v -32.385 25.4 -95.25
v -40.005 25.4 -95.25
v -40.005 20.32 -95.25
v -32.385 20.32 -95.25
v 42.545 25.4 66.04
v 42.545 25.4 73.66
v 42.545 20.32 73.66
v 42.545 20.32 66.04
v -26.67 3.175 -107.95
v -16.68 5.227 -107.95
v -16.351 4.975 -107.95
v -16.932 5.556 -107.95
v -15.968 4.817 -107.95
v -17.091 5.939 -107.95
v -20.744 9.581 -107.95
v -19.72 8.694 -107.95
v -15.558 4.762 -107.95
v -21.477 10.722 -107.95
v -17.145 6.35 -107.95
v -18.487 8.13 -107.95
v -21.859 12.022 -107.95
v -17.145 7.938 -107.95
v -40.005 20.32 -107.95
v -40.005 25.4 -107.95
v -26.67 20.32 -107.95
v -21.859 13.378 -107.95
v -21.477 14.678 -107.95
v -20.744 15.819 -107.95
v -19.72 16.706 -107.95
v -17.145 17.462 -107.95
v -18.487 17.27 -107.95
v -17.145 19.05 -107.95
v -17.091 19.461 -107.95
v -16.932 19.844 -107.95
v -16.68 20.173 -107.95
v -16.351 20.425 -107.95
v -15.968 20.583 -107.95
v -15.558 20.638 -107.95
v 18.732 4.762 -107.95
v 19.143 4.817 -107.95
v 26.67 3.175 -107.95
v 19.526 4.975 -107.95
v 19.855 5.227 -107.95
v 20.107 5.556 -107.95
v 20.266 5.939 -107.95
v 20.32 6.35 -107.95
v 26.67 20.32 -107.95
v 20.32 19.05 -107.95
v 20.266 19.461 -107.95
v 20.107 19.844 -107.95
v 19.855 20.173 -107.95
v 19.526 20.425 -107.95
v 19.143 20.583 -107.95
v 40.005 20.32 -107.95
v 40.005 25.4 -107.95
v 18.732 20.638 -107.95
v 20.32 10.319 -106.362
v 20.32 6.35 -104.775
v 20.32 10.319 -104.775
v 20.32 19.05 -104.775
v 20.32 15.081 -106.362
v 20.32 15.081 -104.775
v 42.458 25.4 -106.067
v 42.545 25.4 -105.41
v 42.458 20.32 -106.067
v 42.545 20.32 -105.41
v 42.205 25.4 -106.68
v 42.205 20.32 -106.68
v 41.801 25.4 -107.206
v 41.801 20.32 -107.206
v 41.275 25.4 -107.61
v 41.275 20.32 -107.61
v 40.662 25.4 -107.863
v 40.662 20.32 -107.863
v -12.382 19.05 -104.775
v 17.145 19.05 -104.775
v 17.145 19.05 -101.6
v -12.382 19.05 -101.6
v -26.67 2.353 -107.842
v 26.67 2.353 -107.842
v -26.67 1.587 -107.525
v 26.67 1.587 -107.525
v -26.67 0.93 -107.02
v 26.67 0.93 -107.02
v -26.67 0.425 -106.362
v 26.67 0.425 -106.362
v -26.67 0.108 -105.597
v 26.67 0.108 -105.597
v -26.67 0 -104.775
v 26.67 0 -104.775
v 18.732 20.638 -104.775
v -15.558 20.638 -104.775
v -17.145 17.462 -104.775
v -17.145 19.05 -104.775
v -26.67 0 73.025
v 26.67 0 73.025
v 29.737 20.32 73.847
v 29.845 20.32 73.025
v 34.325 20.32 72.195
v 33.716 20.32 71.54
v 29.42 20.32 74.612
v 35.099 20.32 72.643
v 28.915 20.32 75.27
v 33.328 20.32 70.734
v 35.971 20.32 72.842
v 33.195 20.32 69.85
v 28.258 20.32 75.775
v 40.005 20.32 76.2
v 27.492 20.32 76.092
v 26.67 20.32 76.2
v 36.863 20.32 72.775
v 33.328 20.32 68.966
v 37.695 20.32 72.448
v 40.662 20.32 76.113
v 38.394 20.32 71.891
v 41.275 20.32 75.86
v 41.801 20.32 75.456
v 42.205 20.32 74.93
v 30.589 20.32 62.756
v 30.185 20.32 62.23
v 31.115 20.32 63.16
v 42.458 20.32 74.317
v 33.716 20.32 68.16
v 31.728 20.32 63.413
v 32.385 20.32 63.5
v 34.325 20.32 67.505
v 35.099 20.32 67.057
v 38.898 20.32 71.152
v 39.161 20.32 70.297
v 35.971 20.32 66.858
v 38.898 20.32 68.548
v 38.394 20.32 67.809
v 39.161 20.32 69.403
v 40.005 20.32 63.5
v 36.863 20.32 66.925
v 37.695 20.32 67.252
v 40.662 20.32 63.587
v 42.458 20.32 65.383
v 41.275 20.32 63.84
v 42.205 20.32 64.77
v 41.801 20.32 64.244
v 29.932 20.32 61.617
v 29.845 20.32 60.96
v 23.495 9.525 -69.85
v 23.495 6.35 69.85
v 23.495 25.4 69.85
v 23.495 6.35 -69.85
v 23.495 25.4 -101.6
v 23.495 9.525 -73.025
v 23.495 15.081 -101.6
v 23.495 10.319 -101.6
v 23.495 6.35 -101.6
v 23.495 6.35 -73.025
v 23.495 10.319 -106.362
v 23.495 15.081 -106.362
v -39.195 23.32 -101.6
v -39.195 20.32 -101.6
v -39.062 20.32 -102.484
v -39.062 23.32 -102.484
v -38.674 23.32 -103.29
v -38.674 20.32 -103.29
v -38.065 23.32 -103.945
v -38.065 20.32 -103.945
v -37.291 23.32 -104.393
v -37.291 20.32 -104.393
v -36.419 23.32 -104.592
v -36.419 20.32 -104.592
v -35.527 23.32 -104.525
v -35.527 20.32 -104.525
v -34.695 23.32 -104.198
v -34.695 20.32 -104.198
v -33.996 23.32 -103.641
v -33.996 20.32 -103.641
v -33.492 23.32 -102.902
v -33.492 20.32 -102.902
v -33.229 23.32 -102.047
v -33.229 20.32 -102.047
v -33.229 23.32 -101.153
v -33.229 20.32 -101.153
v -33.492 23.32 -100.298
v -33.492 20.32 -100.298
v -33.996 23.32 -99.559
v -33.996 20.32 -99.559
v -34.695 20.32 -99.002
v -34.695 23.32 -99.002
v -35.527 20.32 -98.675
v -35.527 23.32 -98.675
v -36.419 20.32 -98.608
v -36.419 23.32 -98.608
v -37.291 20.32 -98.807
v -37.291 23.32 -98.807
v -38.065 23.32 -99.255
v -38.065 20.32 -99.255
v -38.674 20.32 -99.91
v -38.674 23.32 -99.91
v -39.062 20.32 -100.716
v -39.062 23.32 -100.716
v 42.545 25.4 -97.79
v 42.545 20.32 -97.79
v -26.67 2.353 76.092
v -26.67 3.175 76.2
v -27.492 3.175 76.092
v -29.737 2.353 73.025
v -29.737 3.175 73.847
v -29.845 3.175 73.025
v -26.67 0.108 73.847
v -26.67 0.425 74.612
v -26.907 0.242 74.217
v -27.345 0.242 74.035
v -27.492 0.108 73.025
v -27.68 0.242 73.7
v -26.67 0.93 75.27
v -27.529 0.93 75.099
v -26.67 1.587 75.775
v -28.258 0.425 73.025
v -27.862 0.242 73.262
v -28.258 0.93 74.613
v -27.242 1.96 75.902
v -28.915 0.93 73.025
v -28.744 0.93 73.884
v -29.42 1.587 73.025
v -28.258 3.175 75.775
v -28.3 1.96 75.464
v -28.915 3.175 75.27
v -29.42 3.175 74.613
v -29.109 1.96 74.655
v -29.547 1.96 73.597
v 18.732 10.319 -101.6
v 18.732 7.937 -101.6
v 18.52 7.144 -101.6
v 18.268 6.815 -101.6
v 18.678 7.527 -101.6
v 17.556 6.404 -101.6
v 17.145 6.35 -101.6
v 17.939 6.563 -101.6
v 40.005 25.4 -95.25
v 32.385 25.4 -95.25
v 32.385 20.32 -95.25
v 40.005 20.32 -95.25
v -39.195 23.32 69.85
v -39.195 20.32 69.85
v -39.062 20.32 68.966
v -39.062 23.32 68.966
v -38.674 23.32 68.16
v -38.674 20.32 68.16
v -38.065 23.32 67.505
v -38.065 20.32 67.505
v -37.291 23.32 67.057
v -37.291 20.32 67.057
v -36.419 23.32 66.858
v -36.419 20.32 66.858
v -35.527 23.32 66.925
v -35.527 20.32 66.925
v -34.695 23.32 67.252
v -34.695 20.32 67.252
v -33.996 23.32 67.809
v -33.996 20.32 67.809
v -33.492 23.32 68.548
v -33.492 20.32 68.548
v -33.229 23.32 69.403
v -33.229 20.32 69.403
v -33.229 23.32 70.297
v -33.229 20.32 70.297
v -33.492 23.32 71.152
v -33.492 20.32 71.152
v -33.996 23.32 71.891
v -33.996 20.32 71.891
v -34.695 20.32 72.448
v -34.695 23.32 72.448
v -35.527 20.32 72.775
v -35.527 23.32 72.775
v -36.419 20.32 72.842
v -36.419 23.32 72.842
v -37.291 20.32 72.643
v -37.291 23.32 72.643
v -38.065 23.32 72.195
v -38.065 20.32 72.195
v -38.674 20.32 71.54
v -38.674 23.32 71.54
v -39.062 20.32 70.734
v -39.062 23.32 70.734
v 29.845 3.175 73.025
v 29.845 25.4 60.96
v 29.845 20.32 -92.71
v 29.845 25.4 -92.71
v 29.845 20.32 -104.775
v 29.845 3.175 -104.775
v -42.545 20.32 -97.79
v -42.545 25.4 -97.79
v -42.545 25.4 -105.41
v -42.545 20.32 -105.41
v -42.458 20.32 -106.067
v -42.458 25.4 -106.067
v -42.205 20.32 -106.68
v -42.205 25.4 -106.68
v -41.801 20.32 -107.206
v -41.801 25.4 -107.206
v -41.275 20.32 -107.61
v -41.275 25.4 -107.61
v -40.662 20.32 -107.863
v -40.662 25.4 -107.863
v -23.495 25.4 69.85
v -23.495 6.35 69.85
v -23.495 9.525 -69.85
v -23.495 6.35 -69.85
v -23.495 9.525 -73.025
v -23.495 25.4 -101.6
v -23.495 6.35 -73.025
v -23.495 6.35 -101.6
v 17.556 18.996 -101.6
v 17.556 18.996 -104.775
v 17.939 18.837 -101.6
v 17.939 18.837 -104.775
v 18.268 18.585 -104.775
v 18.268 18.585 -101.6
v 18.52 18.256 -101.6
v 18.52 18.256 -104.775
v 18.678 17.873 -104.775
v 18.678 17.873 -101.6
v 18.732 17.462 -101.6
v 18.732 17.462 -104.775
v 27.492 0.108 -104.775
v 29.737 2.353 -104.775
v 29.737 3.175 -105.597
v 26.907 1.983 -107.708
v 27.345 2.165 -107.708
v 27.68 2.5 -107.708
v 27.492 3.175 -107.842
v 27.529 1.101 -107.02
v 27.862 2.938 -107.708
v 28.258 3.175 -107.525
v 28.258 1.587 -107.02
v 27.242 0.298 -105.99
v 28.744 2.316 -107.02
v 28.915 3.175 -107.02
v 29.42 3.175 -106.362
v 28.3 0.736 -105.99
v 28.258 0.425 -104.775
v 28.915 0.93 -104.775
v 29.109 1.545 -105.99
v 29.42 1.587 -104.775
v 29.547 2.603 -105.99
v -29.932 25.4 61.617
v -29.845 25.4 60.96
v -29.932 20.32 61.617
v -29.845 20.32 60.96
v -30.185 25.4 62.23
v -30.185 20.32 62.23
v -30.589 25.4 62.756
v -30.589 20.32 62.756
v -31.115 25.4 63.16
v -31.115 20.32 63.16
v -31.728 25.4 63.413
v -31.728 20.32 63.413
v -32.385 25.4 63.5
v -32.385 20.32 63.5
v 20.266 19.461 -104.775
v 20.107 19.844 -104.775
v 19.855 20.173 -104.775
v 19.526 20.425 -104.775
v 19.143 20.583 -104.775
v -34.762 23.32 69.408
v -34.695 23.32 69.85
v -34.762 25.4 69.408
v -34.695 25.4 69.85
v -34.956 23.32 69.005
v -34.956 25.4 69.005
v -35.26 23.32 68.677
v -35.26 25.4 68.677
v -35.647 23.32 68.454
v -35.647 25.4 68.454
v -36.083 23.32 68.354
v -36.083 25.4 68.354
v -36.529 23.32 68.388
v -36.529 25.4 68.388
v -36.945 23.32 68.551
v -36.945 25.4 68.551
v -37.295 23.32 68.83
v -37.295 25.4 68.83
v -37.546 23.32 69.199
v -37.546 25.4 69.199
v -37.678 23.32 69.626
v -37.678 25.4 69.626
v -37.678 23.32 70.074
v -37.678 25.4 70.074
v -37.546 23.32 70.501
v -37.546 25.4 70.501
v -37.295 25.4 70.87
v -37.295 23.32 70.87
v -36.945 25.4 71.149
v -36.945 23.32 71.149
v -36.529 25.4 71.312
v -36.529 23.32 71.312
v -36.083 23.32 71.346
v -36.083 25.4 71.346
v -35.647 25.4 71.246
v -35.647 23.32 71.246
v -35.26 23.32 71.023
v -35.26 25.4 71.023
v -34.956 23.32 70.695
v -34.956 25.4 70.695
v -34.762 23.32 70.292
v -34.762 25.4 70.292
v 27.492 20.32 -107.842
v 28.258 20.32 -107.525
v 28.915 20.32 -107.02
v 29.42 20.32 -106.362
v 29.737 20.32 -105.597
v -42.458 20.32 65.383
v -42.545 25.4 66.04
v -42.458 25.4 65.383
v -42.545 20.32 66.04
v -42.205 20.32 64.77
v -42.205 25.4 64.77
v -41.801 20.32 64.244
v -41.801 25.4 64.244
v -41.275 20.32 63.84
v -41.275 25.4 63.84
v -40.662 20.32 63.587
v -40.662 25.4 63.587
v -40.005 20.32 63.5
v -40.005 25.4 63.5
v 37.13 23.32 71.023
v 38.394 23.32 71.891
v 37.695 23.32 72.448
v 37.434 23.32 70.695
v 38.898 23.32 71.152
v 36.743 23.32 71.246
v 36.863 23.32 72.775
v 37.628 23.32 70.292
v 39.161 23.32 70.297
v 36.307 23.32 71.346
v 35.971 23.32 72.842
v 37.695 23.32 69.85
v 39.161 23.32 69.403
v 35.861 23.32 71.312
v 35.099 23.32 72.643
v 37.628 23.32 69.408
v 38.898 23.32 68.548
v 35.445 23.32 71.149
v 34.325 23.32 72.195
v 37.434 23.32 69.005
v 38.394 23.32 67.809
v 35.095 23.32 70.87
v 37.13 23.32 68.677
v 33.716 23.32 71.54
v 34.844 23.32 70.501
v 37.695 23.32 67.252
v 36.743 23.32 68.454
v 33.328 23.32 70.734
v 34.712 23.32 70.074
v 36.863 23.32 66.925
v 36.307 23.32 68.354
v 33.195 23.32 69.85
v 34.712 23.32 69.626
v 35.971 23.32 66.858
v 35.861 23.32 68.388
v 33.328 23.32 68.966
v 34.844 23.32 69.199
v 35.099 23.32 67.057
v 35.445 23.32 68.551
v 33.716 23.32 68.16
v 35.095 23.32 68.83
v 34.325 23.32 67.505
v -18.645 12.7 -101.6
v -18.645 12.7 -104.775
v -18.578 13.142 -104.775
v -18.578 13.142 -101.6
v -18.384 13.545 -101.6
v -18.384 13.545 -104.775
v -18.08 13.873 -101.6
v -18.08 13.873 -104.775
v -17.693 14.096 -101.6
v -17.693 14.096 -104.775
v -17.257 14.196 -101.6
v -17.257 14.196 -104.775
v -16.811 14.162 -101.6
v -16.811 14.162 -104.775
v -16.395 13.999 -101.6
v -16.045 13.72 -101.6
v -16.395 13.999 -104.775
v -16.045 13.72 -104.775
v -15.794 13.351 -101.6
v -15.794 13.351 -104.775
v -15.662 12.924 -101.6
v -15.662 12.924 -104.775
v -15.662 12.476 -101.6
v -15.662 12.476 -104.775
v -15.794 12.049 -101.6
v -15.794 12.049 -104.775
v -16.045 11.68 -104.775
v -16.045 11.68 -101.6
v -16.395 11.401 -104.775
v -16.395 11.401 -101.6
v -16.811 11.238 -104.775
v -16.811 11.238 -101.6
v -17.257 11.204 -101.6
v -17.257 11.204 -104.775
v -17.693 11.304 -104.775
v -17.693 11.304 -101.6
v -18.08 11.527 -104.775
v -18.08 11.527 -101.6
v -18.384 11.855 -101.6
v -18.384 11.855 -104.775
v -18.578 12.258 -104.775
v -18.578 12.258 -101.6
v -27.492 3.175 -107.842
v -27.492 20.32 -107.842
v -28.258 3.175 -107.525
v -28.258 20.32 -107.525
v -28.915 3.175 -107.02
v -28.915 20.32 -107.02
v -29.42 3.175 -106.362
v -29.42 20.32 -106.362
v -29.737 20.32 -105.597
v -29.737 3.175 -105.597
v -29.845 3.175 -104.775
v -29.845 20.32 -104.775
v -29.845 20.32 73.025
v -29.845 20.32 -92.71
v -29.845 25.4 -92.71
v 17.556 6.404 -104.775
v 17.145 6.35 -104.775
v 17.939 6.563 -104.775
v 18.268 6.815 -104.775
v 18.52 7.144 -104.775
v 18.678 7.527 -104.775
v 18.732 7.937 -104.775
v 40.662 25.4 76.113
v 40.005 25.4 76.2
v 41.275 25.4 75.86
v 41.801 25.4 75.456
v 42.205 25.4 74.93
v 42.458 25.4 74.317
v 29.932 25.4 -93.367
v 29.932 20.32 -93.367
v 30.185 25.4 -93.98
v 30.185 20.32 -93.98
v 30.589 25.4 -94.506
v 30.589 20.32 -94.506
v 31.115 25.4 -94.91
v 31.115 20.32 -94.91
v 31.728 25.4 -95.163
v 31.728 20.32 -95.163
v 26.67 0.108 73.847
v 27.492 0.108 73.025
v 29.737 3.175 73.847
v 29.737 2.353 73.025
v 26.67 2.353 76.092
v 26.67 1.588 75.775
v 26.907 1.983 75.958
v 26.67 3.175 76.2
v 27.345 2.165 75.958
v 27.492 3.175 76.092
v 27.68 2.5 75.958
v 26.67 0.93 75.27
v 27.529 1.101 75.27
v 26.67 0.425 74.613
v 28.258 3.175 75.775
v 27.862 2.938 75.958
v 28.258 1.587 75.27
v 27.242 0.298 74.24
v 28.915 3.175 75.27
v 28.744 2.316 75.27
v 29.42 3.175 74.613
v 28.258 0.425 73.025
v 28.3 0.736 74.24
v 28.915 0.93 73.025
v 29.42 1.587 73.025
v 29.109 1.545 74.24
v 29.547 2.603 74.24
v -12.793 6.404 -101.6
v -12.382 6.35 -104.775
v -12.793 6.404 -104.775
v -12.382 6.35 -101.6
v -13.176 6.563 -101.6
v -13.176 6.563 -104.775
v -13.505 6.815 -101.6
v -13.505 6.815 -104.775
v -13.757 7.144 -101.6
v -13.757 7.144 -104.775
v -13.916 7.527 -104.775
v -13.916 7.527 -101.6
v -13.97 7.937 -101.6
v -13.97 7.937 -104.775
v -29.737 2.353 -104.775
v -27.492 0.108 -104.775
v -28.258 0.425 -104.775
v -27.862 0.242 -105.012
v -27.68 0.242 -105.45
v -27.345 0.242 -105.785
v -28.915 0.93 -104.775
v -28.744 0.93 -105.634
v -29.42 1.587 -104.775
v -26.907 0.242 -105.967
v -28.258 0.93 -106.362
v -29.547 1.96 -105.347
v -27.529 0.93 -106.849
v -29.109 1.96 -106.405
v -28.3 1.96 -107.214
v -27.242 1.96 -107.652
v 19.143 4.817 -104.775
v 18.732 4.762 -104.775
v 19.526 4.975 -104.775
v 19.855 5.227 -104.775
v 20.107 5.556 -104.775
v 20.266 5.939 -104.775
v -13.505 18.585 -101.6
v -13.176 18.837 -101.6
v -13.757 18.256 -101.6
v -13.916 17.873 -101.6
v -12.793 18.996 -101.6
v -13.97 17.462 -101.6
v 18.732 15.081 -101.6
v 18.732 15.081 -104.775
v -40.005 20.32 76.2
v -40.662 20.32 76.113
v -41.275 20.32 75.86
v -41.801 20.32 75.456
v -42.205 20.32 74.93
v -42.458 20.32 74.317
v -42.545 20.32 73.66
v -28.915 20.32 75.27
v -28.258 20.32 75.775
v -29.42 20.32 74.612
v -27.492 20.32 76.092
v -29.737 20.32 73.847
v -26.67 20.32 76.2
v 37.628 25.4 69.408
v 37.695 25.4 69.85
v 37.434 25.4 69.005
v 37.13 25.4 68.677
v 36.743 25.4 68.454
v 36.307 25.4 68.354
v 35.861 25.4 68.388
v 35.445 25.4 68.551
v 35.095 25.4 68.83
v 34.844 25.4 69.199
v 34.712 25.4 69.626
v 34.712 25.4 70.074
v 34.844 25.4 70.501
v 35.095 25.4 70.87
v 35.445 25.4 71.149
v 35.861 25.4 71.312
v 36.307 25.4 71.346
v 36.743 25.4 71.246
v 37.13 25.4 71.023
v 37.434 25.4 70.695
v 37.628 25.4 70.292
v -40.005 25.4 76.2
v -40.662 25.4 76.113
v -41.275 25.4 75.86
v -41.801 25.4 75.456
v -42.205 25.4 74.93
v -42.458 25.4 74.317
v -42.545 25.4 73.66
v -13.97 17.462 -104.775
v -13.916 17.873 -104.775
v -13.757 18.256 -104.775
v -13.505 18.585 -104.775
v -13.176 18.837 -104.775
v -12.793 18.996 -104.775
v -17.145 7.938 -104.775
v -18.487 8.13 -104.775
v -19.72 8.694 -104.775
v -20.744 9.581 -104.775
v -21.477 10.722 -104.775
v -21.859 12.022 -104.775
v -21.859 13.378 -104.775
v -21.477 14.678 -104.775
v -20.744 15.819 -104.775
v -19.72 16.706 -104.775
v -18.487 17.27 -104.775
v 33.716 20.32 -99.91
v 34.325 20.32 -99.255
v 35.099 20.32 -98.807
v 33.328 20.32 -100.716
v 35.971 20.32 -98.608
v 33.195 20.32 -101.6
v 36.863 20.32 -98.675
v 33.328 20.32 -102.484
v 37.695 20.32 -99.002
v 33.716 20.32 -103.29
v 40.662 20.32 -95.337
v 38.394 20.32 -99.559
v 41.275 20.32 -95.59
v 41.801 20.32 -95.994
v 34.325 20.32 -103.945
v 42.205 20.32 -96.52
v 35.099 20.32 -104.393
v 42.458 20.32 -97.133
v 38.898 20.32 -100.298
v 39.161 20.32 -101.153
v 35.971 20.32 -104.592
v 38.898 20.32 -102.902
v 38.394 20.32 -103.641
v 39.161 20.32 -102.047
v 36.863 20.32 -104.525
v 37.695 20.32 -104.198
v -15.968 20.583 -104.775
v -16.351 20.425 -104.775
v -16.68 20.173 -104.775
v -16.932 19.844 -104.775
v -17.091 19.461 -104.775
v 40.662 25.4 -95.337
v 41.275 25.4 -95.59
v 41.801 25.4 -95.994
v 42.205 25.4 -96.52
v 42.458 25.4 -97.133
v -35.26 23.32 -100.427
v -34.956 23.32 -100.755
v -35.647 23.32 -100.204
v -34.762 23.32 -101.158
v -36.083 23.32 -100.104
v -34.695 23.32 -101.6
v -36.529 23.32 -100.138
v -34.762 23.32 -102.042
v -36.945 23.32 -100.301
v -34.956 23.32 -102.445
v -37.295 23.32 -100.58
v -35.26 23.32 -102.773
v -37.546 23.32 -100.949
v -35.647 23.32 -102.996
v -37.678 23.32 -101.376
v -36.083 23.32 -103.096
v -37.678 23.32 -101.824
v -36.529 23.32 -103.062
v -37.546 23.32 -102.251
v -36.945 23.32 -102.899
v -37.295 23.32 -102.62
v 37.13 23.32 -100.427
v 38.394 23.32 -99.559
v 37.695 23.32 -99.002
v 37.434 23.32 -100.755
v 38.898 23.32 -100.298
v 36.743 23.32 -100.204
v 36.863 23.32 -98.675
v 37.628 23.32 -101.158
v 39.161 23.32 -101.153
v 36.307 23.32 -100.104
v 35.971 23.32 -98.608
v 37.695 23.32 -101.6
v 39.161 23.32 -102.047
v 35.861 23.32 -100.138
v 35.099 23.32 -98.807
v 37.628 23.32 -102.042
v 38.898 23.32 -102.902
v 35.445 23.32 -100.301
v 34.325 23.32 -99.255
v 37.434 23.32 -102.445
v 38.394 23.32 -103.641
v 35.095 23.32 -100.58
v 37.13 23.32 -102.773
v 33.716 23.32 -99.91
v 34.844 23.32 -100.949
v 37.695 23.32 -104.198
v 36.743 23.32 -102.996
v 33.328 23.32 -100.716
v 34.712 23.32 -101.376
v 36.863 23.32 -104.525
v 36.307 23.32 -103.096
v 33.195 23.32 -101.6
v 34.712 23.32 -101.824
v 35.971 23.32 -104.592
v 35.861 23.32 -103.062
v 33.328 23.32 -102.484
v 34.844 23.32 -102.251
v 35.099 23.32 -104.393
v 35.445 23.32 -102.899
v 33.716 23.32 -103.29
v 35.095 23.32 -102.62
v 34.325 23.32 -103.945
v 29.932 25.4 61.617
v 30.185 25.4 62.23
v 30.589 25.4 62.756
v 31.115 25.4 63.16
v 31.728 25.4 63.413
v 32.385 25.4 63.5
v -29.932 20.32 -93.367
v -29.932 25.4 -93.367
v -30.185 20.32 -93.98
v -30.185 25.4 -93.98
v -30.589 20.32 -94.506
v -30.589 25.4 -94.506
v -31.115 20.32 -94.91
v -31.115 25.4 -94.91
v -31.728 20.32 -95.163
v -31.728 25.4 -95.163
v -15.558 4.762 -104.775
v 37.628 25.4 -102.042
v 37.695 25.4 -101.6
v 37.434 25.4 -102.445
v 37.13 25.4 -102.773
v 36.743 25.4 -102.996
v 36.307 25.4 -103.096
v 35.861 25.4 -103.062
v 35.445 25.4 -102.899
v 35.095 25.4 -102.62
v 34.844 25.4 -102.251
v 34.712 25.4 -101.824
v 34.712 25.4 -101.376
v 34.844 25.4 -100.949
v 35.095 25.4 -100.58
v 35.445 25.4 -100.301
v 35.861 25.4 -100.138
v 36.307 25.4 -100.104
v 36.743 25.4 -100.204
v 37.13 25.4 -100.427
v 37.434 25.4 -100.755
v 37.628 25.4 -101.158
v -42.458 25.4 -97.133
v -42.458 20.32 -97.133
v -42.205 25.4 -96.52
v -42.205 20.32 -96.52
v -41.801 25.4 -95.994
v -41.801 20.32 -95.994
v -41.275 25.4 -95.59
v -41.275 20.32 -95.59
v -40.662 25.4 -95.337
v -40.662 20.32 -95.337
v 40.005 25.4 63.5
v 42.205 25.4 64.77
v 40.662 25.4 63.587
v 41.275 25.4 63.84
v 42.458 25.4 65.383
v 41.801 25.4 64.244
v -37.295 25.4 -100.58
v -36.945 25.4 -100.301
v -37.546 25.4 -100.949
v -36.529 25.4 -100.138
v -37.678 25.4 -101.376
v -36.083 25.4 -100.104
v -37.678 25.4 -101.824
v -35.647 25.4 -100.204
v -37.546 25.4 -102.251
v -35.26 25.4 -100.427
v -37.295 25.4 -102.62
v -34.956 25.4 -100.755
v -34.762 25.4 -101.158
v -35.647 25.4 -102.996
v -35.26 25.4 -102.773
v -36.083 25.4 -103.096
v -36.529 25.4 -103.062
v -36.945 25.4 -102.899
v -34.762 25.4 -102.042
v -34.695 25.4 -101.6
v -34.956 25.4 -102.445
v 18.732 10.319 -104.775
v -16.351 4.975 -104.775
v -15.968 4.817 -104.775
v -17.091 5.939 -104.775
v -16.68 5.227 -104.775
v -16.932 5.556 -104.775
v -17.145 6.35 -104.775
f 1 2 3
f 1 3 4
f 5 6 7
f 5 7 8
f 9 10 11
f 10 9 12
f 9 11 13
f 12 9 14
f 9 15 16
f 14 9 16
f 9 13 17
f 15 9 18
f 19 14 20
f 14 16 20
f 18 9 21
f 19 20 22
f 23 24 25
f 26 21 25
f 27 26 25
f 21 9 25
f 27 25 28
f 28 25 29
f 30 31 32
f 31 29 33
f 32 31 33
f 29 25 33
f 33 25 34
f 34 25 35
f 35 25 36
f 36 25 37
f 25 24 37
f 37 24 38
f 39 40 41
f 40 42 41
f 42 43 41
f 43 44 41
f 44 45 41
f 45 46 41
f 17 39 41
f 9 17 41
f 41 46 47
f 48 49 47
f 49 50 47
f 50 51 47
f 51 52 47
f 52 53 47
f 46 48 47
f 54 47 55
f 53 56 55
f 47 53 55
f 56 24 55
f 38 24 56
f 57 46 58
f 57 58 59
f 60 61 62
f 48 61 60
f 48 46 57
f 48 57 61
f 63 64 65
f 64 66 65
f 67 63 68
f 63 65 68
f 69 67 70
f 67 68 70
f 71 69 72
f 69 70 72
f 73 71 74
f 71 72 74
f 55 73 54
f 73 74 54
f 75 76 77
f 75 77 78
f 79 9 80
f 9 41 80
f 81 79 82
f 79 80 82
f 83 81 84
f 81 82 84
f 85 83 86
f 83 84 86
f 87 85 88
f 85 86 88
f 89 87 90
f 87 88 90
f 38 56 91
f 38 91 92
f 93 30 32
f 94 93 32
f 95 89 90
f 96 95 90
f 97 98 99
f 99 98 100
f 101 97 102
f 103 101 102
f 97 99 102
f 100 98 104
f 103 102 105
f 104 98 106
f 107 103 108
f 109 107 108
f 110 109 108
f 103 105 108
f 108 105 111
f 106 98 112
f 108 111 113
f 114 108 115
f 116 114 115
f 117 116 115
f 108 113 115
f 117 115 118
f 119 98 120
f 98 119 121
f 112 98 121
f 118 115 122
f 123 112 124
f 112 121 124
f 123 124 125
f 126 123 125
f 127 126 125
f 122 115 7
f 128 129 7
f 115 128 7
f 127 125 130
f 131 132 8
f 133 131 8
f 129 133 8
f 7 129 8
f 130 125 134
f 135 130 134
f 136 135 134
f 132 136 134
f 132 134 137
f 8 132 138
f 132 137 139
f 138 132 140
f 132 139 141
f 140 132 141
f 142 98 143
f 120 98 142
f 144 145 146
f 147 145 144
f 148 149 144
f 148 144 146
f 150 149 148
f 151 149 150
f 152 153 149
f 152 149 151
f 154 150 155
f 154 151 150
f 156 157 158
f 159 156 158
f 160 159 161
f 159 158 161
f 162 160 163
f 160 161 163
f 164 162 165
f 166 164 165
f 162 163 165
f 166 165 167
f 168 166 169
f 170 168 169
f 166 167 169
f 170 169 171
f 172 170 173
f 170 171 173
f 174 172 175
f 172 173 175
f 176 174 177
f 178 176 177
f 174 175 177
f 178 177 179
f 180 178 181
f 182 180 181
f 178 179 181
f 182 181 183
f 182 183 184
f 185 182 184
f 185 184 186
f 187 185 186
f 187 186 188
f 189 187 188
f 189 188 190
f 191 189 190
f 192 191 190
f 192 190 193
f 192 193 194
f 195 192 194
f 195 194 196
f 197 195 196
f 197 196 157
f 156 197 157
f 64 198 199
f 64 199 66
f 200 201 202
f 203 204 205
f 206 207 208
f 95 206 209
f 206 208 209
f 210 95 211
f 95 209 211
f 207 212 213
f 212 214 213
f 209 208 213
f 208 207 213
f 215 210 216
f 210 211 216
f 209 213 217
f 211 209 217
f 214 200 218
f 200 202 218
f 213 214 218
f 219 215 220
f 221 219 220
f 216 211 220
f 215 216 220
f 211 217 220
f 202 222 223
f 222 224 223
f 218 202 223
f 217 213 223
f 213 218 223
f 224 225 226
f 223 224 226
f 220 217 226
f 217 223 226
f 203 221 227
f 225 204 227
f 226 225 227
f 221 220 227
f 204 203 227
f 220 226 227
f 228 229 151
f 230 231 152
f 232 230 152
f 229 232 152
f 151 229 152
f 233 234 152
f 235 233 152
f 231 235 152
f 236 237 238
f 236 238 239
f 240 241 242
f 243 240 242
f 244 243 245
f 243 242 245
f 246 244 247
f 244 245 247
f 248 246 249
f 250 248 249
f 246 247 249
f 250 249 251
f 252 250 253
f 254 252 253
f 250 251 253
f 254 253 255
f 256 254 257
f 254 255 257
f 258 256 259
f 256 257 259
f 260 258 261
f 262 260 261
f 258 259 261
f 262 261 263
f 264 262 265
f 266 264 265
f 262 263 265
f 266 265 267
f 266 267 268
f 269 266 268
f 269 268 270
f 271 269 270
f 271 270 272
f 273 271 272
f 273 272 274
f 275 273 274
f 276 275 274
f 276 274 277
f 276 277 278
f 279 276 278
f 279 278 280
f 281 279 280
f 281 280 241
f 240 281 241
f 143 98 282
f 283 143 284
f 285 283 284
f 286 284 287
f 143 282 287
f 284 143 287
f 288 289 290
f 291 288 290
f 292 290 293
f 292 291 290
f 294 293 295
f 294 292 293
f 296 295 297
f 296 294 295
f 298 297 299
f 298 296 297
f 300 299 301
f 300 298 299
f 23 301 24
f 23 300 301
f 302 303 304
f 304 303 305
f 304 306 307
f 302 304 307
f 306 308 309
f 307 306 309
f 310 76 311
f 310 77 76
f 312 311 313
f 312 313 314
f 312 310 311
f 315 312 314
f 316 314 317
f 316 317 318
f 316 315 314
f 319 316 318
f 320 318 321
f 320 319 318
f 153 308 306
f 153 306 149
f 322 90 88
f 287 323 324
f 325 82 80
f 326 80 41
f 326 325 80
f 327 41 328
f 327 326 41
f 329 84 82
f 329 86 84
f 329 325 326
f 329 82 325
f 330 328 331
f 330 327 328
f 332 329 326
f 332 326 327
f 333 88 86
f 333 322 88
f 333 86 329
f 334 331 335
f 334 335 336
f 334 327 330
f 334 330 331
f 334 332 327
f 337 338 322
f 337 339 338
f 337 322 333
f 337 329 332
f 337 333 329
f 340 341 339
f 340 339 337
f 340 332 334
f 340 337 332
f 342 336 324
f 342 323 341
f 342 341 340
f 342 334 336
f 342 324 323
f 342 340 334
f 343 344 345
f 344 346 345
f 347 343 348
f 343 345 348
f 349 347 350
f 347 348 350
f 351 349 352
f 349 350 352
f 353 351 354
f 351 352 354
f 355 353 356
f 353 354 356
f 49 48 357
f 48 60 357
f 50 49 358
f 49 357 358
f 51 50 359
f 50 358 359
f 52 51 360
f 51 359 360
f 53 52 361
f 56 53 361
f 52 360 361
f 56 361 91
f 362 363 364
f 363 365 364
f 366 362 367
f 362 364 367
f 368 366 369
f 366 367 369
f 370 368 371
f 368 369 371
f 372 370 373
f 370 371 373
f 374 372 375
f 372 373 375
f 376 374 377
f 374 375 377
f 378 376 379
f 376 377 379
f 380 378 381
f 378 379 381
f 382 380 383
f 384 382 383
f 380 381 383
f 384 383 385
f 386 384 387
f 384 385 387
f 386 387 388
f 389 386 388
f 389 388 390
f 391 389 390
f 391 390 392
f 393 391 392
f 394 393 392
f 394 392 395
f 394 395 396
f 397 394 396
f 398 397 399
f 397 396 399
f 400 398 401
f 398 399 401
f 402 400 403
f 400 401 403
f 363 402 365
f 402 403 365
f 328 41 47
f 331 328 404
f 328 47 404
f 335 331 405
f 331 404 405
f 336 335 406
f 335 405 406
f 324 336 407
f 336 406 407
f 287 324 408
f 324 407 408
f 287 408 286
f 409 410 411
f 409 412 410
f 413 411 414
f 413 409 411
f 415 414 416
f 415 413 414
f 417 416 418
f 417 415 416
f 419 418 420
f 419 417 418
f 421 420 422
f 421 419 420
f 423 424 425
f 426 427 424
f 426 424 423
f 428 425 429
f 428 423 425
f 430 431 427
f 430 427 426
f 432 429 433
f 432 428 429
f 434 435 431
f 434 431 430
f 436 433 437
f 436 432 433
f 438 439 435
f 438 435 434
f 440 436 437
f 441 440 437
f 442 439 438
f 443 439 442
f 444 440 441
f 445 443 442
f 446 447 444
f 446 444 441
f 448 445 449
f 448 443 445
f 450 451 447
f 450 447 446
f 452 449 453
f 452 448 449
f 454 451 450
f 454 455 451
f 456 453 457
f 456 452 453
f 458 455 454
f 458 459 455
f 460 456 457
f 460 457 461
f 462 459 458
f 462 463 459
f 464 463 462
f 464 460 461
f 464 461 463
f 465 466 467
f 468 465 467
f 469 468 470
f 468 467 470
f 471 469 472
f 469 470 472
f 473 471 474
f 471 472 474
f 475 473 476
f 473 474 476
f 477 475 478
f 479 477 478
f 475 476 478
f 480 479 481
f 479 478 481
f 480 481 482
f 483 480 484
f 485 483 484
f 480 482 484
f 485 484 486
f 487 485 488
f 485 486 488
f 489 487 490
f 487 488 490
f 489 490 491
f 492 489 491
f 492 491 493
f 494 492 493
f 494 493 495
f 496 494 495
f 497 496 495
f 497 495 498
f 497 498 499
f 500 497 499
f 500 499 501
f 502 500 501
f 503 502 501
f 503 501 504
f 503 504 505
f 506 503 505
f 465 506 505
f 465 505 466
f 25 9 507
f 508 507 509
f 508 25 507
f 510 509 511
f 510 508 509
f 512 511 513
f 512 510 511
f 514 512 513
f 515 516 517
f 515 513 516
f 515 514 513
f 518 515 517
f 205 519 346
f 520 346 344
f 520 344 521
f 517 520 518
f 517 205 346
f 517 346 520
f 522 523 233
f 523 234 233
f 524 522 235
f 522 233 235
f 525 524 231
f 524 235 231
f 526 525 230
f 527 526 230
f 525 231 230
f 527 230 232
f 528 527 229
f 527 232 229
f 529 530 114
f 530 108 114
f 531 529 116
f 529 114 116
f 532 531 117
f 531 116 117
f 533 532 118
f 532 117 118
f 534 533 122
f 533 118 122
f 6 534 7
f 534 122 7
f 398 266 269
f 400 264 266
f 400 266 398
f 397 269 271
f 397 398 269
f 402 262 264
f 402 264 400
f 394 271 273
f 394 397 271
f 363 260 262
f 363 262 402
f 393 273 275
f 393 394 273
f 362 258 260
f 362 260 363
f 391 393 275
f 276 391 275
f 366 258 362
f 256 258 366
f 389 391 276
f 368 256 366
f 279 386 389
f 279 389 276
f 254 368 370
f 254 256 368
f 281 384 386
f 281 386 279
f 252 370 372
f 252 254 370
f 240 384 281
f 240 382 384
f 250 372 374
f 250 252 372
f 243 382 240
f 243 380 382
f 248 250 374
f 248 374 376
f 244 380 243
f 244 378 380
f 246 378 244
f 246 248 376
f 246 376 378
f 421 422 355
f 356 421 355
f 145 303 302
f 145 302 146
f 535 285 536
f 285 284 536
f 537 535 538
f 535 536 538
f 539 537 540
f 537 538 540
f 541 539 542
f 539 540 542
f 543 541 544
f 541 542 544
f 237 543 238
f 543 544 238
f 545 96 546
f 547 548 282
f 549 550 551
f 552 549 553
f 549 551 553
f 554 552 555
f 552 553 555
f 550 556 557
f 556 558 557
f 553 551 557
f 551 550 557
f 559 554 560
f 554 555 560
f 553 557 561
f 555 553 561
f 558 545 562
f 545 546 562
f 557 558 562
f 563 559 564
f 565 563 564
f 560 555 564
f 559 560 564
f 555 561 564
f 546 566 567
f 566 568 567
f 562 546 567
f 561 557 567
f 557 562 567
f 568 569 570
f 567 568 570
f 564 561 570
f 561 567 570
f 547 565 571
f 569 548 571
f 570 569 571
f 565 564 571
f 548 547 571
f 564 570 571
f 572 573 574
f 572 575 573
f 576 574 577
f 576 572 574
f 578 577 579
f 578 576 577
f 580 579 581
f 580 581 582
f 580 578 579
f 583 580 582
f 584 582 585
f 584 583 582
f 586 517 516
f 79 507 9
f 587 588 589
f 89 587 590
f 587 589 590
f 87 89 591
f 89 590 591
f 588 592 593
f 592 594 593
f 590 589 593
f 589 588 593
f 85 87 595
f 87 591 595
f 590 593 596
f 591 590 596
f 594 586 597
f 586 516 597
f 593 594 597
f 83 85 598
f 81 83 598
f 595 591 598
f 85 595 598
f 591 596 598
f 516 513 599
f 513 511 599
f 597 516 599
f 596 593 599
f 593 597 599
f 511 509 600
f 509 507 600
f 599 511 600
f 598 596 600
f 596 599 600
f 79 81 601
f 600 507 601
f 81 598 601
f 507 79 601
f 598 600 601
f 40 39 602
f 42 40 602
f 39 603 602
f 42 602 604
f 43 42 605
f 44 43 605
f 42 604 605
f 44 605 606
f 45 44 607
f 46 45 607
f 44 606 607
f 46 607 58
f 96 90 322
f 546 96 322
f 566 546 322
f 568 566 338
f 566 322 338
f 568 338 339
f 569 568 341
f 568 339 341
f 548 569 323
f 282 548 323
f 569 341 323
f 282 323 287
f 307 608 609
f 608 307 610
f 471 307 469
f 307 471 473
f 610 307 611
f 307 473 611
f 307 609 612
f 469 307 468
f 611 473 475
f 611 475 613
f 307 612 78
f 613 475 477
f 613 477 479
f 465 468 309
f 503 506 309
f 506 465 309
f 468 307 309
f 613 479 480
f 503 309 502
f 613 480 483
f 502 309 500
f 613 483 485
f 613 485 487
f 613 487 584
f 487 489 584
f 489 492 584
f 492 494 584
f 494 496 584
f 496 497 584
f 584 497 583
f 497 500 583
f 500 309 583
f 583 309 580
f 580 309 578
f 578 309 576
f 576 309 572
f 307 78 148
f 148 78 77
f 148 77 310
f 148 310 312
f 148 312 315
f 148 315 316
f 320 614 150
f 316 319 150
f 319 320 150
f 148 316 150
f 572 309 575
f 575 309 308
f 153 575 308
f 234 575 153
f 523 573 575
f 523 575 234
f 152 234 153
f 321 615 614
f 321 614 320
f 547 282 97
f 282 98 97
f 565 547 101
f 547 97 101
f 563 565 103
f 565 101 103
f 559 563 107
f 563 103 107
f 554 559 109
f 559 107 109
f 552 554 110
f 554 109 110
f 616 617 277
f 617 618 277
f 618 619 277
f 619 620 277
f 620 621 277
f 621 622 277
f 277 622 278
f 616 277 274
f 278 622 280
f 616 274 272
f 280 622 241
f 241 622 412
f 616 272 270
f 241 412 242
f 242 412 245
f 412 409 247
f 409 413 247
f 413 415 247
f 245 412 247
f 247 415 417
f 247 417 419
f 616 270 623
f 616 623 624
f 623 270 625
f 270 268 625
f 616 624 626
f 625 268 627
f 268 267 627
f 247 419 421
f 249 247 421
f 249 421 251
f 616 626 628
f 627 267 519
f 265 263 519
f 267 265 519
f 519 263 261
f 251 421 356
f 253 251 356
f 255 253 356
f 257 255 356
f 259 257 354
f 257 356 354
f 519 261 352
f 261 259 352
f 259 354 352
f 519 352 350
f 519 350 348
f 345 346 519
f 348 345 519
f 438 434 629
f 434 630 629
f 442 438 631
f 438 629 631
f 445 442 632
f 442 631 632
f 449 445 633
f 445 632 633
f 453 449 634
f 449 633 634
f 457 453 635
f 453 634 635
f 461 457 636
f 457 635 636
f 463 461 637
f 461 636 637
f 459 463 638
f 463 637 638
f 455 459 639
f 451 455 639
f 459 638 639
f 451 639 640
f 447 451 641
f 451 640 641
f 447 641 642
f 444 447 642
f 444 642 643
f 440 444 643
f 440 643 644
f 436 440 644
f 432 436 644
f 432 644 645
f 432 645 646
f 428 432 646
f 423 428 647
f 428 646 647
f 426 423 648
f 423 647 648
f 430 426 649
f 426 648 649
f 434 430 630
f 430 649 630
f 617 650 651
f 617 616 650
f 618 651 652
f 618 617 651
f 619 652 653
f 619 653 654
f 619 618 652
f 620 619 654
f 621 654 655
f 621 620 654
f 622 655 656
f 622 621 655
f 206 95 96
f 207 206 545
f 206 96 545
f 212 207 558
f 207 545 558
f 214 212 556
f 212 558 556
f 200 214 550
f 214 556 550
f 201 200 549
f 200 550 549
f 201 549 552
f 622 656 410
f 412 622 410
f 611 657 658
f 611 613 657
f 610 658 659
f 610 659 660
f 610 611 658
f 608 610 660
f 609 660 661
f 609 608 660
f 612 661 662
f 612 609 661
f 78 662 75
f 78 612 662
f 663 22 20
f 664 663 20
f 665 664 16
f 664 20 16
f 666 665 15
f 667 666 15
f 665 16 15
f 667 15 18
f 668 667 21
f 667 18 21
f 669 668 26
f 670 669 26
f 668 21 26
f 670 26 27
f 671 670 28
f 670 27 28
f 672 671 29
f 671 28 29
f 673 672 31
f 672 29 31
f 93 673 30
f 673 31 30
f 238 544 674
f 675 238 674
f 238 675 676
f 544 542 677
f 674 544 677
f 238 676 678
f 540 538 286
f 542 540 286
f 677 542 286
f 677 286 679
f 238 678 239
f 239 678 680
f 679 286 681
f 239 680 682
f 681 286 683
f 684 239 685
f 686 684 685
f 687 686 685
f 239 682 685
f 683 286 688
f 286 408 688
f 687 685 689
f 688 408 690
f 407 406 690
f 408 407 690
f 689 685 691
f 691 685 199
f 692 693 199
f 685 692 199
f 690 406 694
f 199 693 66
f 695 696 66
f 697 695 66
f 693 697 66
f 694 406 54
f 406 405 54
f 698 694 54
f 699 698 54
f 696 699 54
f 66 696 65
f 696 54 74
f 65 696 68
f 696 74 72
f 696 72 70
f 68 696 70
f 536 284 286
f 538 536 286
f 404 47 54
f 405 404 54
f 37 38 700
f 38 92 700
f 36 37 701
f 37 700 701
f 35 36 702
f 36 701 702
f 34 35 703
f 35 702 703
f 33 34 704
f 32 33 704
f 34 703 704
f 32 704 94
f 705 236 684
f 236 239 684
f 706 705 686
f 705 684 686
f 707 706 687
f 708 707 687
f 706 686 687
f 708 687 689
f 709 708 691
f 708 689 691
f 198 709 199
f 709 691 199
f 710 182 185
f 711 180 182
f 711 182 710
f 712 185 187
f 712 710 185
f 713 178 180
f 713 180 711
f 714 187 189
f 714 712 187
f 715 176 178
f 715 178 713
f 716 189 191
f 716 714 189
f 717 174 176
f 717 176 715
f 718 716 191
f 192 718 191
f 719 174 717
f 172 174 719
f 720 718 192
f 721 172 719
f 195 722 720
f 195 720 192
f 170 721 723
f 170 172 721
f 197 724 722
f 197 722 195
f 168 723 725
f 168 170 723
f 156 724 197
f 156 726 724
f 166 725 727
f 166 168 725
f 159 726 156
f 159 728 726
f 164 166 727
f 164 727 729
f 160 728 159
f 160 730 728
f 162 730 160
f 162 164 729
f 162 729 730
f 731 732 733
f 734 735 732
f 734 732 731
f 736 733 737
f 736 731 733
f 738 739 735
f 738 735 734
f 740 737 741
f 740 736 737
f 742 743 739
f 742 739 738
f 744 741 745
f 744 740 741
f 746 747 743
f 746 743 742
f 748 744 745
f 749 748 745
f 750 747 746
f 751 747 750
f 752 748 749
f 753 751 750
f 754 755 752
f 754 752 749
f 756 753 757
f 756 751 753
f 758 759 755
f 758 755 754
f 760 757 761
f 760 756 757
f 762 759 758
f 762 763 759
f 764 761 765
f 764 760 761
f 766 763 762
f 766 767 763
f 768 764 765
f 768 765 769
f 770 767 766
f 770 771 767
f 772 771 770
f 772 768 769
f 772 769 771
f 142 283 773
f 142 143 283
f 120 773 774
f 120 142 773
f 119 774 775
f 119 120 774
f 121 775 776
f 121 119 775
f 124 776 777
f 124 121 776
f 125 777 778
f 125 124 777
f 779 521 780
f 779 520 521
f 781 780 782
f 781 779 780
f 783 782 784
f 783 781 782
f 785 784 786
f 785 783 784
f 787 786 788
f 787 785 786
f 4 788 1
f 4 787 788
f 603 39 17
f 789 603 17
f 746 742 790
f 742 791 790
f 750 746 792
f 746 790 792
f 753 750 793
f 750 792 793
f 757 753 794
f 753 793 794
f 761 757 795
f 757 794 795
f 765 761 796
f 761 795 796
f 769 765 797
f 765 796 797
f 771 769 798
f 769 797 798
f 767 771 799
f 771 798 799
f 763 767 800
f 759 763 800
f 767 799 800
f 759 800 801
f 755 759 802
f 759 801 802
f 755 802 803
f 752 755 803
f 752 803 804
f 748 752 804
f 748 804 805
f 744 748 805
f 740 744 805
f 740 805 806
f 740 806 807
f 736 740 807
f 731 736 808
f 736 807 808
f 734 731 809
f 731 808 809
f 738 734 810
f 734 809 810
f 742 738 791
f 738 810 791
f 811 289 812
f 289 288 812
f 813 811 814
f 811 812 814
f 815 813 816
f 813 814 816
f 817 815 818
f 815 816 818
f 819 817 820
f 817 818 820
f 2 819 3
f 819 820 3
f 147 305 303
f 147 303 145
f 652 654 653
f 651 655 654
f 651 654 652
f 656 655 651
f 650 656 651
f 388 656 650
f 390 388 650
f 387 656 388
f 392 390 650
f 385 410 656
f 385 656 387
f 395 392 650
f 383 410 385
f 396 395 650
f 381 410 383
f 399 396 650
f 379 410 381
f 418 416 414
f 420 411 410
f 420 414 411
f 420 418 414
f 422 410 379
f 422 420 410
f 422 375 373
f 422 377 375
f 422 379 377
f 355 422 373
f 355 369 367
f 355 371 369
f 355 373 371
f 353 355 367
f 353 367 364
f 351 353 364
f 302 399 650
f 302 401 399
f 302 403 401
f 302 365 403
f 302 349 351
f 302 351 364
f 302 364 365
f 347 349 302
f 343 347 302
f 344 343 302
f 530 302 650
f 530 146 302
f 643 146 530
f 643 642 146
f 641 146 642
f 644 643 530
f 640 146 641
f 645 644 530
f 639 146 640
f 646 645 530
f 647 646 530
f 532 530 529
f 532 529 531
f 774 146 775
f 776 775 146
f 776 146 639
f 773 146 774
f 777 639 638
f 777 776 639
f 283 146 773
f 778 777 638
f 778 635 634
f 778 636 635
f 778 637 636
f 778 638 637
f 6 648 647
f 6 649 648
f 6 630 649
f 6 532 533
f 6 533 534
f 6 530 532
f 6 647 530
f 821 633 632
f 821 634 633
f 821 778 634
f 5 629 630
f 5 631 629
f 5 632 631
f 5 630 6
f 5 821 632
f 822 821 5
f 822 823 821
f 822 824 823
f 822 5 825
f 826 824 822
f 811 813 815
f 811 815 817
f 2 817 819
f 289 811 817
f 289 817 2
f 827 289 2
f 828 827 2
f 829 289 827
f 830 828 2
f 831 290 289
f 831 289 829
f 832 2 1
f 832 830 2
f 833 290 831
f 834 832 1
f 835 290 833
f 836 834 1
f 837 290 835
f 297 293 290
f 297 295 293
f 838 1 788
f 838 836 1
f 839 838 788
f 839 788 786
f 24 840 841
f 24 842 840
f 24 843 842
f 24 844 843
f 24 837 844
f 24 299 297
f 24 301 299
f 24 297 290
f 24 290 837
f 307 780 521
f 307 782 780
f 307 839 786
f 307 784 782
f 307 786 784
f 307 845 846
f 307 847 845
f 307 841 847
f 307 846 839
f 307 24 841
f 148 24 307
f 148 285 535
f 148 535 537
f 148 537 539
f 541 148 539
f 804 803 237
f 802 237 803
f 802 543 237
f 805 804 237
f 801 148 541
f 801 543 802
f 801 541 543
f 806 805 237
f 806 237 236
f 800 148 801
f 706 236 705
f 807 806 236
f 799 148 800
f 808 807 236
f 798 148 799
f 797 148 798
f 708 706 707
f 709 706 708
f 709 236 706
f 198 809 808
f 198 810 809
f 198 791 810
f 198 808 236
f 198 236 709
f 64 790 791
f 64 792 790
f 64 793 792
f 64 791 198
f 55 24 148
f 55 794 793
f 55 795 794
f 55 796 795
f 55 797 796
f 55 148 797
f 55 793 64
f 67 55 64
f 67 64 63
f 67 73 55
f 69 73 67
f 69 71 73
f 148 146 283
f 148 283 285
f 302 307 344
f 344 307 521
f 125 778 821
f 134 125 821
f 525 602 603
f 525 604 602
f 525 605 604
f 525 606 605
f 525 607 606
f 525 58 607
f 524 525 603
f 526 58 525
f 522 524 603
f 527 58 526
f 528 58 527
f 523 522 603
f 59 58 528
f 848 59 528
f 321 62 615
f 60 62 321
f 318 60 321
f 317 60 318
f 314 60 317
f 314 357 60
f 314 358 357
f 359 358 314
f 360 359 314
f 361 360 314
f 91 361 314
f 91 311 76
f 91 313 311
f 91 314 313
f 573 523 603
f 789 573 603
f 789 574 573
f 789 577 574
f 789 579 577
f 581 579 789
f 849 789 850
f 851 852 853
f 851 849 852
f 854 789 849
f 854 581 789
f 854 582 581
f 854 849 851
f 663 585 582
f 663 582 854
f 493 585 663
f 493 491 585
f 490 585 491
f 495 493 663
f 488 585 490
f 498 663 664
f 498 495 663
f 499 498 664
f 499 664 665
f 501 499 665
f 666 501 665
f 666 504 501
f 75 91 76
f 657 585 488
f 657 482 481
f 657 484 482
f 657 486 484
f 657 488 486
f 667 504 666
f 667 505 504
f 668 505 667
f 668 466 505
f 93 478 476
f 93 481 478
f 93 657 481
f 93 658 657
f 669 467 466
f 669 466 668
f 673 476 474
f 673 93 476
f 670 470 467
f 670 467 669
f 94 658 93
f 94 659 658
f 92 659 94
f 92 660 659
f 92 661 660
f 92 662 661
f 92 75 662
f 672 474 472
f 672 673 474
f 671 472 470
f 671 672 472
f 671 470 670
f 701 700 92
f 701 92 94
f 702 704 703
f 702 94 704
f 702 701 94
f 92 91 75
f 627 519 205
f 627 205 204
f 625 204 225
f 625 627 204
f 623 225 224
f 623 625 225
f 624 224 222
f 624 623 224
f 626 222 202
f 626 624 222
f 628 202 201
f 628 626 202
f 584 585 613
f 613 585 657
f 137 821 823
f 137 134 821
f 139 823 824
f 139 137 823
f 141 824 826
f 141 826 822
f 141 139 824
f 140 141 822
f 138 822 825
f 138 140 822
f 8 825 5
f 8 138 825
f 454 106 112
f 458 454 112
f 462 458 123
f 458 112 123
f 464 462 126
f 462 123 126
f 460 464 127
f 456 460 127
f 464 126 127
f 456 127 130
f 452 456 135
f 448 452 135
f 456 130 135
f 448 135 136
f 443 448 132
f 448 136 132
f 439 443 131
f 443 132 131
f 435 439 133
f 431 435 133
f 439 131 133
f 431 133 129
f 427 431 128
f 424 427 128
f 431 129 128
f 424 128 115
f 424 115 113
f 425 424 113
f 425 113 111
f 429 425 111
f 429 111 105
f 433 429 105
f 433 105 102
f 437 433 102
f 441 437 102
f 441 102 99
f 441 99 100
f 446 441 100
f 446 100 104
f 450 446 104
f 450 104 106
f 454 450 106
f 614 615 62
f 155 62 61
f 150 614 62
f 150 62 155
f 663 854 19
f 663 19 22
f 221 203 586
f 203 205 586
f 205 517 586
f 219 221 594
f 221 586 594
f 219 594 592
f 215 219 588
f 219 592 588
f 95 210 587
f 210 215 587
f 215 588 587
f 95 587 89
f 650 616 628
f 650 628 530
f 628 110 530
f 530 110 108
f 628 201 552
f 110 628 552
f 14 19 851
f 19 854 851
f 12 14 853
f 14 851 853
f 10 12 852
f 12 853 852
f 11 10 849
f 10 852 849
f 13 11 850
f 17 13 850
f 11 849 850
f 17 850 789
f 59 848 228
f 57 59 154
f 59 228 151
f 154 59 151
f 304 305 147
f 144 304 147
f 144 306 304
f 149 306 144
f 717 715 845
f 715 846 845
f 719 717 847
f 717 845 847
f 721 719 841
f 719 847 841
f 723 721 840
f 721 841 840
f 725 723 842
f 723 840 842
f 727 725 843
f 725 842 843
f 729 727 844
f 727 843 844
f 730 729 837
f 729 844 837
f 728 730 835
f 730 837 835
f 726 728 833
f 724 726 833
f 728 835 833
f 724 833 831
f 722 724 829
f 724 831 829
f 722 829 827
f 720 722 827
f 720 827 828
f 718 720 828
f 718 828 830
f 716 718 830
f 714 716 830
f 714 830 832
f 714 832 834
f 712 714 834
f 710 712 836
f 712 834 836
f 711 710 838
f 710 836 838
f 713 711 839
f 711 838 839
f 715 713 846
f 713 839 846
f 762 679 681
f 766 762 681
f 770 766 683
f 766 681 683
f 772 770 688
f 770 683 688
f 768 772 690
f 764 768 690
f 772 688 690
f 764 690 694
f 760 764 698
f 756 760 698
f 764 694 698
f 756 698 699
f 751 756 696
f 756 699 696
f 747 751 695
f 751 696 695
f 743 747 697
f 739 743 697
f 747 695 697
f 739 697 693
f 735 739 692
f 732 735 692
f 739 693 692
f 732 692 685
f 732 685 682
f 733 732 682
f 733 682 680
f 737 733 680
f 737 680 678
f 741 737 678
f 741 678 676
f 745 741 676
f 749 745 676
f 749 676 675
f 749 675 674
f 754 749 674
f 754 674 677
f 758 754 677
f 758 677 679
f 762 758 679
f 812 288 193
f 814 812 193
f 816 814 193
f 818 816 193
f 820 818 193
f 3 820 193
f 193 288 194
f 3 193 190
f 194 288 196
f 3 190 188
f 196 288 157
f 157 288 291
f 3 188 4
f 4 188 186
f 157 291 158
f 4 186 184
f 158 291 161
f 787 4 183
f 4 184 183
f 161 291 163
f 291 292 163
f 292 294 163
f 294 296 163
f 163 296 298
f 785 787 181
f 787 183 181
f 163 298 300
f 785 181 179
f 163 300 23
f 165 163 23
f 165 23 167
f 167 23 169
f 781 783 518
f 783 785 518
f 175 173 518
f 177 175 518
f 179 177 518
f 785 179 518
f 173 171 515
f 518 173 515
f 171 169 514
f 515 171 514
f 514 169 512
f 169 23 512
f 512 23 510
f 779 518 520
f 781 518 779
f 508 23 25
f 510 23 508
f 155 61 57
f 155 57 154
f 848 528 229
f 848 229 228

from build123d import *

# Parameters (mm, degrees)
SKETCH1_W                                           = 59.69
SKETCH1_H                                           = 184.15
BOSS_EXTRUDE1_DEPTH                                 = 25.4
SHELL1_T                                            = -6.35
SKETCH2_W                                           = 46.99
SKETCH2_H                                           = 3.175
BOSS_EXTRUDE2_DEPTH                                 = 3.175
SKETCH3_W                                           = 12.7
SKETCH3_H                                           = 12.7
BOSS_EXTRUDE3_DEPTH                                 = 5.08
FILLET1_R                                           = 2.54
CBORE_FOR_00_BINDING_HEAD_MACHINE_SCREW_D           = 3.000000096
CBORE_FOR_00_BINDING_HEAD_MACHINE_SCREW_CBORE_D     = 5.999999938
CBORE_FOR_00_BINDING_HEAD_MACHINE_SCREW_CBORE_DEPTH = 3.000000096
SKETCH8_W                                           = 37.465
SKETCH8_H                                           = 15.875
CUT_EXTRUDE1_DEPTH                                  = 3.175
CUT_EXTRUDE2_REACH                                  = 189.636
SKETCH9_R                                           = 1.5
SKETCH9_W                                           = 32.7025
SKETCH9_H                                           = 12.7
FILLET2_R                                           = 1.5875
SKETCH10_W                                          = 4.7625
SKETCH10_H                                          = 4.7625
CUT_EXTRUDE3_DEPTH                                  = 4.7625
FILLET4_R                                           = 3.175


with BuildPart() as part:
    # Sketch1 → Boss-Extrude1 (new body)
    with BuildSketch(Plane(origin=(0, 0, 0), x_dir=(1, 0, 0), z_dir=(0, 1, 0))):
        with Locations((0, 15.875)):
            Rectangle(SKETCH1_W, SKETCH1_H)
    extrude(amount=BOSS_EXTRUDE1_DEPTH)

    # Shell1
    shell1_openings = [part.faces().sort_by_distance(p)[0] for p in [
        (0, 25.4, -15.875),
    ]]
    offset(amount=SHELL1_T, openings=shell1_openings, kind=Kind.INTERSECTION)

    # Sketch2 → Boss-Extrude2 (add)
    with BuildSketch(Plane(origin=(0, 6.35, 0), x_dir=(1, 0, 0), z_dir=(0, 1, 0))):
        with Locations((0, 71.4375)):
            Rectangle(SKETCH2_W, SKETCH2_H)
    extrude(amount=BOSS_EXTRUDE2_DEPTH)

    # Sketch3 → Boss-Extrude3 (add)
    with BuildSketch(Plane(origin=(0, 25.4, 0), x_dir=(1, 0, 0), z_dir=(0, 1, 0))):
        with Locations((-36.195, 101.6)):
            Rectangle(SKETCH3_W, SKETCH3_H)
        with Locations((-36.195, -69.85)):
            Rectangle(SKETCH3_W, SKETCH3_H)
        with Locations((36.195, -69.85)):
            Rectangle(SKETCH3_W, SKETCH3_H)
        with Locations((36.195, 101.6)):
            Rectangle(SKETCH3_W, SKETCH3_H)
    extrude(amount=-BOSS_EXTRUDE3_DEPTH)

    # Fillet1
    fillet1_edges = [part.edges().sort_by_distance(p)[0] for p in [
        (-29.845, 22.86, -95.25),
        (-42.545, 22.86, -95.25),
        (-42.545, 22.86, -107.95),
        (-29.845, 22.86, 63.5),
        (-42.545, 22.86, 76.2),
        (-42.545, 22.86, 63.5),
        (42.545, 22.86, 76.2),
        (29.845, 22.86, 63.5),
        (42.545, 22.86, 63.5),
        (42.545, 22.86, -107.95),
        (42.545, 22.86, -95.25),
        (29.845, 22.86, -95.25),
    ]]
    fillet(fillet1_edges, radius=FILLET1_R)

    # CBORE for #00 Binding Head Machine Screw1 (through all)
    with Locations(Plane(origin=(0, 20.32, 0), x_dir=(-1, 0, 0), z_dir=(0, -1, 0))):
        with Locations((-36.195, -69.85), (36.195, -69.85), (36.195, 101.6), (-36.195, 101.6)):
            CounterBoreHole(CBORE_FOR_00_BINDING_HEAD_MACHINE_SCREW_D / 2, CBORE_FOR_00_BINDING_HEAD_MACHINE_SCREW_CBORE_D / 2, CBORE_FOR_00_BINDING_HEAD_MACHINE_SCREW_CBORE_DEPTH)

    # Sketch8 → Cut-Extrude1 (cut)
    with BuildSketch(Plane(origin=(0, 0, -107.95), x_dir=(-1, 0, 0), z_dir=(0, 0, -1))):
        with BuildLine():
            ThreePointArc((17.145, 7.9375), (21.9075, 12.7), (17.145, 17.4625))
            Line((17.145, 17.4625), (17.145, 7.9375))
        make_face()
        with Locations((-1.5875, 12.7)):
            Rectangle(SKETCH8_W, SKETCH8_H)
    extrude(amount=-CUT_EXTRUDE1_DEPTH, mode=Mode.SUBTRACT)

    # Sketch9 → Cut-Extrude2 (cut, up to next)
    with BuildSketch(Plane(origin=(0, 0, -104.775), x_dir=(-1, 0, 0), z_dir=(0, 0, -1)), mode=Mode.PRIVATE) as cut_extrude2_sk1:
        with Locations((17.145, 12.7)):
            Circle(SKETCH9_R)
    cut_extrude2_tool1 = extrude(cut_extrude2_sk1.sketch, amount=-CUT_EXTRUDE2_REACH, mode=Mode.PRIVATE) & part.part
    # Sketch9 → Cut-Extrude2 (cut, up to next)
    with BuildSketch(Plane(origin=(0, 0, -104.775), x_dir=(-1, 0, 0), z_dir=(0, 0, -1)), mode=Mode.PRIVATE) as cut_extrude2_sk2:
        with Locations((-2.38125, 12.7)):
            Rectangle(SKETCH9_W, SKETCH9_H)
    cut_extrude2_tool2 = extrude(cut_extrude2_sk2.sketch, amount=-CUT_EXTRUDE2_REACH, mode=Mode.PRIVATE) & part.part
    add(cut_extrude2_tool1.solids().sort_by_distance((-17.145, 12.7, -104.775))[0], mode=Mode.SUBTRACT)
    add(cut_extrude2_tool2.solids().sort_by_distance((2.38125, 12.7, -104.775))[0], mode=Mode.SUBTRACT)

    # Fillet2
    fillet2_edges = [part.edges().sort_by_distance(p)[0] for p in [
        (-17.145, 4.7625, -106.3625),
        (20.32, 4.7625, -106.3625),
        (20.32, 20.6375, -106.3625),
        (-17.145, 20.6375, -106.3625),
        (18.7325, 19.05, -103.1875),
        (18.7325, 6.35, -103.1875),
        (-13.97, 6.35, -103.1875),
        (-13.97, 19.05, -103.1875),
    ]]
    fillet(fillet2_edges, radius=FILLET2_R)

    # Sketch10 → Cut-Extrude3 (cut)
    with BuildSketch(Plane.XY.offset(-101.6)):
        with Locations((21.11375, 12.7)):
            Rectangle(SKETCH10_W, SKETCH10_H)
    extrude(amount=-CUT_EXTRUDE3_DEPTH, mode=Mode.SUBTRACT)

    # Fillet4
    fillet4_edges = [part.edges().sort_by_distance(p)[0] for p in [
        (-29.845, 10.16, -107.95),
        (-29.845, 10.16, 76.2),
        (29.845, 0, -15.875),
        (0, 0, 76.2),
        (29.845, 10.16, 76.2),
        (-29.845, 0, -15.875),
        (0, 0, -107.95),
        (29.845, 10.16, -107.95),
    ]]
    fillet(fillet4_edges, radius=FILLET4_R)


solid = part.part
